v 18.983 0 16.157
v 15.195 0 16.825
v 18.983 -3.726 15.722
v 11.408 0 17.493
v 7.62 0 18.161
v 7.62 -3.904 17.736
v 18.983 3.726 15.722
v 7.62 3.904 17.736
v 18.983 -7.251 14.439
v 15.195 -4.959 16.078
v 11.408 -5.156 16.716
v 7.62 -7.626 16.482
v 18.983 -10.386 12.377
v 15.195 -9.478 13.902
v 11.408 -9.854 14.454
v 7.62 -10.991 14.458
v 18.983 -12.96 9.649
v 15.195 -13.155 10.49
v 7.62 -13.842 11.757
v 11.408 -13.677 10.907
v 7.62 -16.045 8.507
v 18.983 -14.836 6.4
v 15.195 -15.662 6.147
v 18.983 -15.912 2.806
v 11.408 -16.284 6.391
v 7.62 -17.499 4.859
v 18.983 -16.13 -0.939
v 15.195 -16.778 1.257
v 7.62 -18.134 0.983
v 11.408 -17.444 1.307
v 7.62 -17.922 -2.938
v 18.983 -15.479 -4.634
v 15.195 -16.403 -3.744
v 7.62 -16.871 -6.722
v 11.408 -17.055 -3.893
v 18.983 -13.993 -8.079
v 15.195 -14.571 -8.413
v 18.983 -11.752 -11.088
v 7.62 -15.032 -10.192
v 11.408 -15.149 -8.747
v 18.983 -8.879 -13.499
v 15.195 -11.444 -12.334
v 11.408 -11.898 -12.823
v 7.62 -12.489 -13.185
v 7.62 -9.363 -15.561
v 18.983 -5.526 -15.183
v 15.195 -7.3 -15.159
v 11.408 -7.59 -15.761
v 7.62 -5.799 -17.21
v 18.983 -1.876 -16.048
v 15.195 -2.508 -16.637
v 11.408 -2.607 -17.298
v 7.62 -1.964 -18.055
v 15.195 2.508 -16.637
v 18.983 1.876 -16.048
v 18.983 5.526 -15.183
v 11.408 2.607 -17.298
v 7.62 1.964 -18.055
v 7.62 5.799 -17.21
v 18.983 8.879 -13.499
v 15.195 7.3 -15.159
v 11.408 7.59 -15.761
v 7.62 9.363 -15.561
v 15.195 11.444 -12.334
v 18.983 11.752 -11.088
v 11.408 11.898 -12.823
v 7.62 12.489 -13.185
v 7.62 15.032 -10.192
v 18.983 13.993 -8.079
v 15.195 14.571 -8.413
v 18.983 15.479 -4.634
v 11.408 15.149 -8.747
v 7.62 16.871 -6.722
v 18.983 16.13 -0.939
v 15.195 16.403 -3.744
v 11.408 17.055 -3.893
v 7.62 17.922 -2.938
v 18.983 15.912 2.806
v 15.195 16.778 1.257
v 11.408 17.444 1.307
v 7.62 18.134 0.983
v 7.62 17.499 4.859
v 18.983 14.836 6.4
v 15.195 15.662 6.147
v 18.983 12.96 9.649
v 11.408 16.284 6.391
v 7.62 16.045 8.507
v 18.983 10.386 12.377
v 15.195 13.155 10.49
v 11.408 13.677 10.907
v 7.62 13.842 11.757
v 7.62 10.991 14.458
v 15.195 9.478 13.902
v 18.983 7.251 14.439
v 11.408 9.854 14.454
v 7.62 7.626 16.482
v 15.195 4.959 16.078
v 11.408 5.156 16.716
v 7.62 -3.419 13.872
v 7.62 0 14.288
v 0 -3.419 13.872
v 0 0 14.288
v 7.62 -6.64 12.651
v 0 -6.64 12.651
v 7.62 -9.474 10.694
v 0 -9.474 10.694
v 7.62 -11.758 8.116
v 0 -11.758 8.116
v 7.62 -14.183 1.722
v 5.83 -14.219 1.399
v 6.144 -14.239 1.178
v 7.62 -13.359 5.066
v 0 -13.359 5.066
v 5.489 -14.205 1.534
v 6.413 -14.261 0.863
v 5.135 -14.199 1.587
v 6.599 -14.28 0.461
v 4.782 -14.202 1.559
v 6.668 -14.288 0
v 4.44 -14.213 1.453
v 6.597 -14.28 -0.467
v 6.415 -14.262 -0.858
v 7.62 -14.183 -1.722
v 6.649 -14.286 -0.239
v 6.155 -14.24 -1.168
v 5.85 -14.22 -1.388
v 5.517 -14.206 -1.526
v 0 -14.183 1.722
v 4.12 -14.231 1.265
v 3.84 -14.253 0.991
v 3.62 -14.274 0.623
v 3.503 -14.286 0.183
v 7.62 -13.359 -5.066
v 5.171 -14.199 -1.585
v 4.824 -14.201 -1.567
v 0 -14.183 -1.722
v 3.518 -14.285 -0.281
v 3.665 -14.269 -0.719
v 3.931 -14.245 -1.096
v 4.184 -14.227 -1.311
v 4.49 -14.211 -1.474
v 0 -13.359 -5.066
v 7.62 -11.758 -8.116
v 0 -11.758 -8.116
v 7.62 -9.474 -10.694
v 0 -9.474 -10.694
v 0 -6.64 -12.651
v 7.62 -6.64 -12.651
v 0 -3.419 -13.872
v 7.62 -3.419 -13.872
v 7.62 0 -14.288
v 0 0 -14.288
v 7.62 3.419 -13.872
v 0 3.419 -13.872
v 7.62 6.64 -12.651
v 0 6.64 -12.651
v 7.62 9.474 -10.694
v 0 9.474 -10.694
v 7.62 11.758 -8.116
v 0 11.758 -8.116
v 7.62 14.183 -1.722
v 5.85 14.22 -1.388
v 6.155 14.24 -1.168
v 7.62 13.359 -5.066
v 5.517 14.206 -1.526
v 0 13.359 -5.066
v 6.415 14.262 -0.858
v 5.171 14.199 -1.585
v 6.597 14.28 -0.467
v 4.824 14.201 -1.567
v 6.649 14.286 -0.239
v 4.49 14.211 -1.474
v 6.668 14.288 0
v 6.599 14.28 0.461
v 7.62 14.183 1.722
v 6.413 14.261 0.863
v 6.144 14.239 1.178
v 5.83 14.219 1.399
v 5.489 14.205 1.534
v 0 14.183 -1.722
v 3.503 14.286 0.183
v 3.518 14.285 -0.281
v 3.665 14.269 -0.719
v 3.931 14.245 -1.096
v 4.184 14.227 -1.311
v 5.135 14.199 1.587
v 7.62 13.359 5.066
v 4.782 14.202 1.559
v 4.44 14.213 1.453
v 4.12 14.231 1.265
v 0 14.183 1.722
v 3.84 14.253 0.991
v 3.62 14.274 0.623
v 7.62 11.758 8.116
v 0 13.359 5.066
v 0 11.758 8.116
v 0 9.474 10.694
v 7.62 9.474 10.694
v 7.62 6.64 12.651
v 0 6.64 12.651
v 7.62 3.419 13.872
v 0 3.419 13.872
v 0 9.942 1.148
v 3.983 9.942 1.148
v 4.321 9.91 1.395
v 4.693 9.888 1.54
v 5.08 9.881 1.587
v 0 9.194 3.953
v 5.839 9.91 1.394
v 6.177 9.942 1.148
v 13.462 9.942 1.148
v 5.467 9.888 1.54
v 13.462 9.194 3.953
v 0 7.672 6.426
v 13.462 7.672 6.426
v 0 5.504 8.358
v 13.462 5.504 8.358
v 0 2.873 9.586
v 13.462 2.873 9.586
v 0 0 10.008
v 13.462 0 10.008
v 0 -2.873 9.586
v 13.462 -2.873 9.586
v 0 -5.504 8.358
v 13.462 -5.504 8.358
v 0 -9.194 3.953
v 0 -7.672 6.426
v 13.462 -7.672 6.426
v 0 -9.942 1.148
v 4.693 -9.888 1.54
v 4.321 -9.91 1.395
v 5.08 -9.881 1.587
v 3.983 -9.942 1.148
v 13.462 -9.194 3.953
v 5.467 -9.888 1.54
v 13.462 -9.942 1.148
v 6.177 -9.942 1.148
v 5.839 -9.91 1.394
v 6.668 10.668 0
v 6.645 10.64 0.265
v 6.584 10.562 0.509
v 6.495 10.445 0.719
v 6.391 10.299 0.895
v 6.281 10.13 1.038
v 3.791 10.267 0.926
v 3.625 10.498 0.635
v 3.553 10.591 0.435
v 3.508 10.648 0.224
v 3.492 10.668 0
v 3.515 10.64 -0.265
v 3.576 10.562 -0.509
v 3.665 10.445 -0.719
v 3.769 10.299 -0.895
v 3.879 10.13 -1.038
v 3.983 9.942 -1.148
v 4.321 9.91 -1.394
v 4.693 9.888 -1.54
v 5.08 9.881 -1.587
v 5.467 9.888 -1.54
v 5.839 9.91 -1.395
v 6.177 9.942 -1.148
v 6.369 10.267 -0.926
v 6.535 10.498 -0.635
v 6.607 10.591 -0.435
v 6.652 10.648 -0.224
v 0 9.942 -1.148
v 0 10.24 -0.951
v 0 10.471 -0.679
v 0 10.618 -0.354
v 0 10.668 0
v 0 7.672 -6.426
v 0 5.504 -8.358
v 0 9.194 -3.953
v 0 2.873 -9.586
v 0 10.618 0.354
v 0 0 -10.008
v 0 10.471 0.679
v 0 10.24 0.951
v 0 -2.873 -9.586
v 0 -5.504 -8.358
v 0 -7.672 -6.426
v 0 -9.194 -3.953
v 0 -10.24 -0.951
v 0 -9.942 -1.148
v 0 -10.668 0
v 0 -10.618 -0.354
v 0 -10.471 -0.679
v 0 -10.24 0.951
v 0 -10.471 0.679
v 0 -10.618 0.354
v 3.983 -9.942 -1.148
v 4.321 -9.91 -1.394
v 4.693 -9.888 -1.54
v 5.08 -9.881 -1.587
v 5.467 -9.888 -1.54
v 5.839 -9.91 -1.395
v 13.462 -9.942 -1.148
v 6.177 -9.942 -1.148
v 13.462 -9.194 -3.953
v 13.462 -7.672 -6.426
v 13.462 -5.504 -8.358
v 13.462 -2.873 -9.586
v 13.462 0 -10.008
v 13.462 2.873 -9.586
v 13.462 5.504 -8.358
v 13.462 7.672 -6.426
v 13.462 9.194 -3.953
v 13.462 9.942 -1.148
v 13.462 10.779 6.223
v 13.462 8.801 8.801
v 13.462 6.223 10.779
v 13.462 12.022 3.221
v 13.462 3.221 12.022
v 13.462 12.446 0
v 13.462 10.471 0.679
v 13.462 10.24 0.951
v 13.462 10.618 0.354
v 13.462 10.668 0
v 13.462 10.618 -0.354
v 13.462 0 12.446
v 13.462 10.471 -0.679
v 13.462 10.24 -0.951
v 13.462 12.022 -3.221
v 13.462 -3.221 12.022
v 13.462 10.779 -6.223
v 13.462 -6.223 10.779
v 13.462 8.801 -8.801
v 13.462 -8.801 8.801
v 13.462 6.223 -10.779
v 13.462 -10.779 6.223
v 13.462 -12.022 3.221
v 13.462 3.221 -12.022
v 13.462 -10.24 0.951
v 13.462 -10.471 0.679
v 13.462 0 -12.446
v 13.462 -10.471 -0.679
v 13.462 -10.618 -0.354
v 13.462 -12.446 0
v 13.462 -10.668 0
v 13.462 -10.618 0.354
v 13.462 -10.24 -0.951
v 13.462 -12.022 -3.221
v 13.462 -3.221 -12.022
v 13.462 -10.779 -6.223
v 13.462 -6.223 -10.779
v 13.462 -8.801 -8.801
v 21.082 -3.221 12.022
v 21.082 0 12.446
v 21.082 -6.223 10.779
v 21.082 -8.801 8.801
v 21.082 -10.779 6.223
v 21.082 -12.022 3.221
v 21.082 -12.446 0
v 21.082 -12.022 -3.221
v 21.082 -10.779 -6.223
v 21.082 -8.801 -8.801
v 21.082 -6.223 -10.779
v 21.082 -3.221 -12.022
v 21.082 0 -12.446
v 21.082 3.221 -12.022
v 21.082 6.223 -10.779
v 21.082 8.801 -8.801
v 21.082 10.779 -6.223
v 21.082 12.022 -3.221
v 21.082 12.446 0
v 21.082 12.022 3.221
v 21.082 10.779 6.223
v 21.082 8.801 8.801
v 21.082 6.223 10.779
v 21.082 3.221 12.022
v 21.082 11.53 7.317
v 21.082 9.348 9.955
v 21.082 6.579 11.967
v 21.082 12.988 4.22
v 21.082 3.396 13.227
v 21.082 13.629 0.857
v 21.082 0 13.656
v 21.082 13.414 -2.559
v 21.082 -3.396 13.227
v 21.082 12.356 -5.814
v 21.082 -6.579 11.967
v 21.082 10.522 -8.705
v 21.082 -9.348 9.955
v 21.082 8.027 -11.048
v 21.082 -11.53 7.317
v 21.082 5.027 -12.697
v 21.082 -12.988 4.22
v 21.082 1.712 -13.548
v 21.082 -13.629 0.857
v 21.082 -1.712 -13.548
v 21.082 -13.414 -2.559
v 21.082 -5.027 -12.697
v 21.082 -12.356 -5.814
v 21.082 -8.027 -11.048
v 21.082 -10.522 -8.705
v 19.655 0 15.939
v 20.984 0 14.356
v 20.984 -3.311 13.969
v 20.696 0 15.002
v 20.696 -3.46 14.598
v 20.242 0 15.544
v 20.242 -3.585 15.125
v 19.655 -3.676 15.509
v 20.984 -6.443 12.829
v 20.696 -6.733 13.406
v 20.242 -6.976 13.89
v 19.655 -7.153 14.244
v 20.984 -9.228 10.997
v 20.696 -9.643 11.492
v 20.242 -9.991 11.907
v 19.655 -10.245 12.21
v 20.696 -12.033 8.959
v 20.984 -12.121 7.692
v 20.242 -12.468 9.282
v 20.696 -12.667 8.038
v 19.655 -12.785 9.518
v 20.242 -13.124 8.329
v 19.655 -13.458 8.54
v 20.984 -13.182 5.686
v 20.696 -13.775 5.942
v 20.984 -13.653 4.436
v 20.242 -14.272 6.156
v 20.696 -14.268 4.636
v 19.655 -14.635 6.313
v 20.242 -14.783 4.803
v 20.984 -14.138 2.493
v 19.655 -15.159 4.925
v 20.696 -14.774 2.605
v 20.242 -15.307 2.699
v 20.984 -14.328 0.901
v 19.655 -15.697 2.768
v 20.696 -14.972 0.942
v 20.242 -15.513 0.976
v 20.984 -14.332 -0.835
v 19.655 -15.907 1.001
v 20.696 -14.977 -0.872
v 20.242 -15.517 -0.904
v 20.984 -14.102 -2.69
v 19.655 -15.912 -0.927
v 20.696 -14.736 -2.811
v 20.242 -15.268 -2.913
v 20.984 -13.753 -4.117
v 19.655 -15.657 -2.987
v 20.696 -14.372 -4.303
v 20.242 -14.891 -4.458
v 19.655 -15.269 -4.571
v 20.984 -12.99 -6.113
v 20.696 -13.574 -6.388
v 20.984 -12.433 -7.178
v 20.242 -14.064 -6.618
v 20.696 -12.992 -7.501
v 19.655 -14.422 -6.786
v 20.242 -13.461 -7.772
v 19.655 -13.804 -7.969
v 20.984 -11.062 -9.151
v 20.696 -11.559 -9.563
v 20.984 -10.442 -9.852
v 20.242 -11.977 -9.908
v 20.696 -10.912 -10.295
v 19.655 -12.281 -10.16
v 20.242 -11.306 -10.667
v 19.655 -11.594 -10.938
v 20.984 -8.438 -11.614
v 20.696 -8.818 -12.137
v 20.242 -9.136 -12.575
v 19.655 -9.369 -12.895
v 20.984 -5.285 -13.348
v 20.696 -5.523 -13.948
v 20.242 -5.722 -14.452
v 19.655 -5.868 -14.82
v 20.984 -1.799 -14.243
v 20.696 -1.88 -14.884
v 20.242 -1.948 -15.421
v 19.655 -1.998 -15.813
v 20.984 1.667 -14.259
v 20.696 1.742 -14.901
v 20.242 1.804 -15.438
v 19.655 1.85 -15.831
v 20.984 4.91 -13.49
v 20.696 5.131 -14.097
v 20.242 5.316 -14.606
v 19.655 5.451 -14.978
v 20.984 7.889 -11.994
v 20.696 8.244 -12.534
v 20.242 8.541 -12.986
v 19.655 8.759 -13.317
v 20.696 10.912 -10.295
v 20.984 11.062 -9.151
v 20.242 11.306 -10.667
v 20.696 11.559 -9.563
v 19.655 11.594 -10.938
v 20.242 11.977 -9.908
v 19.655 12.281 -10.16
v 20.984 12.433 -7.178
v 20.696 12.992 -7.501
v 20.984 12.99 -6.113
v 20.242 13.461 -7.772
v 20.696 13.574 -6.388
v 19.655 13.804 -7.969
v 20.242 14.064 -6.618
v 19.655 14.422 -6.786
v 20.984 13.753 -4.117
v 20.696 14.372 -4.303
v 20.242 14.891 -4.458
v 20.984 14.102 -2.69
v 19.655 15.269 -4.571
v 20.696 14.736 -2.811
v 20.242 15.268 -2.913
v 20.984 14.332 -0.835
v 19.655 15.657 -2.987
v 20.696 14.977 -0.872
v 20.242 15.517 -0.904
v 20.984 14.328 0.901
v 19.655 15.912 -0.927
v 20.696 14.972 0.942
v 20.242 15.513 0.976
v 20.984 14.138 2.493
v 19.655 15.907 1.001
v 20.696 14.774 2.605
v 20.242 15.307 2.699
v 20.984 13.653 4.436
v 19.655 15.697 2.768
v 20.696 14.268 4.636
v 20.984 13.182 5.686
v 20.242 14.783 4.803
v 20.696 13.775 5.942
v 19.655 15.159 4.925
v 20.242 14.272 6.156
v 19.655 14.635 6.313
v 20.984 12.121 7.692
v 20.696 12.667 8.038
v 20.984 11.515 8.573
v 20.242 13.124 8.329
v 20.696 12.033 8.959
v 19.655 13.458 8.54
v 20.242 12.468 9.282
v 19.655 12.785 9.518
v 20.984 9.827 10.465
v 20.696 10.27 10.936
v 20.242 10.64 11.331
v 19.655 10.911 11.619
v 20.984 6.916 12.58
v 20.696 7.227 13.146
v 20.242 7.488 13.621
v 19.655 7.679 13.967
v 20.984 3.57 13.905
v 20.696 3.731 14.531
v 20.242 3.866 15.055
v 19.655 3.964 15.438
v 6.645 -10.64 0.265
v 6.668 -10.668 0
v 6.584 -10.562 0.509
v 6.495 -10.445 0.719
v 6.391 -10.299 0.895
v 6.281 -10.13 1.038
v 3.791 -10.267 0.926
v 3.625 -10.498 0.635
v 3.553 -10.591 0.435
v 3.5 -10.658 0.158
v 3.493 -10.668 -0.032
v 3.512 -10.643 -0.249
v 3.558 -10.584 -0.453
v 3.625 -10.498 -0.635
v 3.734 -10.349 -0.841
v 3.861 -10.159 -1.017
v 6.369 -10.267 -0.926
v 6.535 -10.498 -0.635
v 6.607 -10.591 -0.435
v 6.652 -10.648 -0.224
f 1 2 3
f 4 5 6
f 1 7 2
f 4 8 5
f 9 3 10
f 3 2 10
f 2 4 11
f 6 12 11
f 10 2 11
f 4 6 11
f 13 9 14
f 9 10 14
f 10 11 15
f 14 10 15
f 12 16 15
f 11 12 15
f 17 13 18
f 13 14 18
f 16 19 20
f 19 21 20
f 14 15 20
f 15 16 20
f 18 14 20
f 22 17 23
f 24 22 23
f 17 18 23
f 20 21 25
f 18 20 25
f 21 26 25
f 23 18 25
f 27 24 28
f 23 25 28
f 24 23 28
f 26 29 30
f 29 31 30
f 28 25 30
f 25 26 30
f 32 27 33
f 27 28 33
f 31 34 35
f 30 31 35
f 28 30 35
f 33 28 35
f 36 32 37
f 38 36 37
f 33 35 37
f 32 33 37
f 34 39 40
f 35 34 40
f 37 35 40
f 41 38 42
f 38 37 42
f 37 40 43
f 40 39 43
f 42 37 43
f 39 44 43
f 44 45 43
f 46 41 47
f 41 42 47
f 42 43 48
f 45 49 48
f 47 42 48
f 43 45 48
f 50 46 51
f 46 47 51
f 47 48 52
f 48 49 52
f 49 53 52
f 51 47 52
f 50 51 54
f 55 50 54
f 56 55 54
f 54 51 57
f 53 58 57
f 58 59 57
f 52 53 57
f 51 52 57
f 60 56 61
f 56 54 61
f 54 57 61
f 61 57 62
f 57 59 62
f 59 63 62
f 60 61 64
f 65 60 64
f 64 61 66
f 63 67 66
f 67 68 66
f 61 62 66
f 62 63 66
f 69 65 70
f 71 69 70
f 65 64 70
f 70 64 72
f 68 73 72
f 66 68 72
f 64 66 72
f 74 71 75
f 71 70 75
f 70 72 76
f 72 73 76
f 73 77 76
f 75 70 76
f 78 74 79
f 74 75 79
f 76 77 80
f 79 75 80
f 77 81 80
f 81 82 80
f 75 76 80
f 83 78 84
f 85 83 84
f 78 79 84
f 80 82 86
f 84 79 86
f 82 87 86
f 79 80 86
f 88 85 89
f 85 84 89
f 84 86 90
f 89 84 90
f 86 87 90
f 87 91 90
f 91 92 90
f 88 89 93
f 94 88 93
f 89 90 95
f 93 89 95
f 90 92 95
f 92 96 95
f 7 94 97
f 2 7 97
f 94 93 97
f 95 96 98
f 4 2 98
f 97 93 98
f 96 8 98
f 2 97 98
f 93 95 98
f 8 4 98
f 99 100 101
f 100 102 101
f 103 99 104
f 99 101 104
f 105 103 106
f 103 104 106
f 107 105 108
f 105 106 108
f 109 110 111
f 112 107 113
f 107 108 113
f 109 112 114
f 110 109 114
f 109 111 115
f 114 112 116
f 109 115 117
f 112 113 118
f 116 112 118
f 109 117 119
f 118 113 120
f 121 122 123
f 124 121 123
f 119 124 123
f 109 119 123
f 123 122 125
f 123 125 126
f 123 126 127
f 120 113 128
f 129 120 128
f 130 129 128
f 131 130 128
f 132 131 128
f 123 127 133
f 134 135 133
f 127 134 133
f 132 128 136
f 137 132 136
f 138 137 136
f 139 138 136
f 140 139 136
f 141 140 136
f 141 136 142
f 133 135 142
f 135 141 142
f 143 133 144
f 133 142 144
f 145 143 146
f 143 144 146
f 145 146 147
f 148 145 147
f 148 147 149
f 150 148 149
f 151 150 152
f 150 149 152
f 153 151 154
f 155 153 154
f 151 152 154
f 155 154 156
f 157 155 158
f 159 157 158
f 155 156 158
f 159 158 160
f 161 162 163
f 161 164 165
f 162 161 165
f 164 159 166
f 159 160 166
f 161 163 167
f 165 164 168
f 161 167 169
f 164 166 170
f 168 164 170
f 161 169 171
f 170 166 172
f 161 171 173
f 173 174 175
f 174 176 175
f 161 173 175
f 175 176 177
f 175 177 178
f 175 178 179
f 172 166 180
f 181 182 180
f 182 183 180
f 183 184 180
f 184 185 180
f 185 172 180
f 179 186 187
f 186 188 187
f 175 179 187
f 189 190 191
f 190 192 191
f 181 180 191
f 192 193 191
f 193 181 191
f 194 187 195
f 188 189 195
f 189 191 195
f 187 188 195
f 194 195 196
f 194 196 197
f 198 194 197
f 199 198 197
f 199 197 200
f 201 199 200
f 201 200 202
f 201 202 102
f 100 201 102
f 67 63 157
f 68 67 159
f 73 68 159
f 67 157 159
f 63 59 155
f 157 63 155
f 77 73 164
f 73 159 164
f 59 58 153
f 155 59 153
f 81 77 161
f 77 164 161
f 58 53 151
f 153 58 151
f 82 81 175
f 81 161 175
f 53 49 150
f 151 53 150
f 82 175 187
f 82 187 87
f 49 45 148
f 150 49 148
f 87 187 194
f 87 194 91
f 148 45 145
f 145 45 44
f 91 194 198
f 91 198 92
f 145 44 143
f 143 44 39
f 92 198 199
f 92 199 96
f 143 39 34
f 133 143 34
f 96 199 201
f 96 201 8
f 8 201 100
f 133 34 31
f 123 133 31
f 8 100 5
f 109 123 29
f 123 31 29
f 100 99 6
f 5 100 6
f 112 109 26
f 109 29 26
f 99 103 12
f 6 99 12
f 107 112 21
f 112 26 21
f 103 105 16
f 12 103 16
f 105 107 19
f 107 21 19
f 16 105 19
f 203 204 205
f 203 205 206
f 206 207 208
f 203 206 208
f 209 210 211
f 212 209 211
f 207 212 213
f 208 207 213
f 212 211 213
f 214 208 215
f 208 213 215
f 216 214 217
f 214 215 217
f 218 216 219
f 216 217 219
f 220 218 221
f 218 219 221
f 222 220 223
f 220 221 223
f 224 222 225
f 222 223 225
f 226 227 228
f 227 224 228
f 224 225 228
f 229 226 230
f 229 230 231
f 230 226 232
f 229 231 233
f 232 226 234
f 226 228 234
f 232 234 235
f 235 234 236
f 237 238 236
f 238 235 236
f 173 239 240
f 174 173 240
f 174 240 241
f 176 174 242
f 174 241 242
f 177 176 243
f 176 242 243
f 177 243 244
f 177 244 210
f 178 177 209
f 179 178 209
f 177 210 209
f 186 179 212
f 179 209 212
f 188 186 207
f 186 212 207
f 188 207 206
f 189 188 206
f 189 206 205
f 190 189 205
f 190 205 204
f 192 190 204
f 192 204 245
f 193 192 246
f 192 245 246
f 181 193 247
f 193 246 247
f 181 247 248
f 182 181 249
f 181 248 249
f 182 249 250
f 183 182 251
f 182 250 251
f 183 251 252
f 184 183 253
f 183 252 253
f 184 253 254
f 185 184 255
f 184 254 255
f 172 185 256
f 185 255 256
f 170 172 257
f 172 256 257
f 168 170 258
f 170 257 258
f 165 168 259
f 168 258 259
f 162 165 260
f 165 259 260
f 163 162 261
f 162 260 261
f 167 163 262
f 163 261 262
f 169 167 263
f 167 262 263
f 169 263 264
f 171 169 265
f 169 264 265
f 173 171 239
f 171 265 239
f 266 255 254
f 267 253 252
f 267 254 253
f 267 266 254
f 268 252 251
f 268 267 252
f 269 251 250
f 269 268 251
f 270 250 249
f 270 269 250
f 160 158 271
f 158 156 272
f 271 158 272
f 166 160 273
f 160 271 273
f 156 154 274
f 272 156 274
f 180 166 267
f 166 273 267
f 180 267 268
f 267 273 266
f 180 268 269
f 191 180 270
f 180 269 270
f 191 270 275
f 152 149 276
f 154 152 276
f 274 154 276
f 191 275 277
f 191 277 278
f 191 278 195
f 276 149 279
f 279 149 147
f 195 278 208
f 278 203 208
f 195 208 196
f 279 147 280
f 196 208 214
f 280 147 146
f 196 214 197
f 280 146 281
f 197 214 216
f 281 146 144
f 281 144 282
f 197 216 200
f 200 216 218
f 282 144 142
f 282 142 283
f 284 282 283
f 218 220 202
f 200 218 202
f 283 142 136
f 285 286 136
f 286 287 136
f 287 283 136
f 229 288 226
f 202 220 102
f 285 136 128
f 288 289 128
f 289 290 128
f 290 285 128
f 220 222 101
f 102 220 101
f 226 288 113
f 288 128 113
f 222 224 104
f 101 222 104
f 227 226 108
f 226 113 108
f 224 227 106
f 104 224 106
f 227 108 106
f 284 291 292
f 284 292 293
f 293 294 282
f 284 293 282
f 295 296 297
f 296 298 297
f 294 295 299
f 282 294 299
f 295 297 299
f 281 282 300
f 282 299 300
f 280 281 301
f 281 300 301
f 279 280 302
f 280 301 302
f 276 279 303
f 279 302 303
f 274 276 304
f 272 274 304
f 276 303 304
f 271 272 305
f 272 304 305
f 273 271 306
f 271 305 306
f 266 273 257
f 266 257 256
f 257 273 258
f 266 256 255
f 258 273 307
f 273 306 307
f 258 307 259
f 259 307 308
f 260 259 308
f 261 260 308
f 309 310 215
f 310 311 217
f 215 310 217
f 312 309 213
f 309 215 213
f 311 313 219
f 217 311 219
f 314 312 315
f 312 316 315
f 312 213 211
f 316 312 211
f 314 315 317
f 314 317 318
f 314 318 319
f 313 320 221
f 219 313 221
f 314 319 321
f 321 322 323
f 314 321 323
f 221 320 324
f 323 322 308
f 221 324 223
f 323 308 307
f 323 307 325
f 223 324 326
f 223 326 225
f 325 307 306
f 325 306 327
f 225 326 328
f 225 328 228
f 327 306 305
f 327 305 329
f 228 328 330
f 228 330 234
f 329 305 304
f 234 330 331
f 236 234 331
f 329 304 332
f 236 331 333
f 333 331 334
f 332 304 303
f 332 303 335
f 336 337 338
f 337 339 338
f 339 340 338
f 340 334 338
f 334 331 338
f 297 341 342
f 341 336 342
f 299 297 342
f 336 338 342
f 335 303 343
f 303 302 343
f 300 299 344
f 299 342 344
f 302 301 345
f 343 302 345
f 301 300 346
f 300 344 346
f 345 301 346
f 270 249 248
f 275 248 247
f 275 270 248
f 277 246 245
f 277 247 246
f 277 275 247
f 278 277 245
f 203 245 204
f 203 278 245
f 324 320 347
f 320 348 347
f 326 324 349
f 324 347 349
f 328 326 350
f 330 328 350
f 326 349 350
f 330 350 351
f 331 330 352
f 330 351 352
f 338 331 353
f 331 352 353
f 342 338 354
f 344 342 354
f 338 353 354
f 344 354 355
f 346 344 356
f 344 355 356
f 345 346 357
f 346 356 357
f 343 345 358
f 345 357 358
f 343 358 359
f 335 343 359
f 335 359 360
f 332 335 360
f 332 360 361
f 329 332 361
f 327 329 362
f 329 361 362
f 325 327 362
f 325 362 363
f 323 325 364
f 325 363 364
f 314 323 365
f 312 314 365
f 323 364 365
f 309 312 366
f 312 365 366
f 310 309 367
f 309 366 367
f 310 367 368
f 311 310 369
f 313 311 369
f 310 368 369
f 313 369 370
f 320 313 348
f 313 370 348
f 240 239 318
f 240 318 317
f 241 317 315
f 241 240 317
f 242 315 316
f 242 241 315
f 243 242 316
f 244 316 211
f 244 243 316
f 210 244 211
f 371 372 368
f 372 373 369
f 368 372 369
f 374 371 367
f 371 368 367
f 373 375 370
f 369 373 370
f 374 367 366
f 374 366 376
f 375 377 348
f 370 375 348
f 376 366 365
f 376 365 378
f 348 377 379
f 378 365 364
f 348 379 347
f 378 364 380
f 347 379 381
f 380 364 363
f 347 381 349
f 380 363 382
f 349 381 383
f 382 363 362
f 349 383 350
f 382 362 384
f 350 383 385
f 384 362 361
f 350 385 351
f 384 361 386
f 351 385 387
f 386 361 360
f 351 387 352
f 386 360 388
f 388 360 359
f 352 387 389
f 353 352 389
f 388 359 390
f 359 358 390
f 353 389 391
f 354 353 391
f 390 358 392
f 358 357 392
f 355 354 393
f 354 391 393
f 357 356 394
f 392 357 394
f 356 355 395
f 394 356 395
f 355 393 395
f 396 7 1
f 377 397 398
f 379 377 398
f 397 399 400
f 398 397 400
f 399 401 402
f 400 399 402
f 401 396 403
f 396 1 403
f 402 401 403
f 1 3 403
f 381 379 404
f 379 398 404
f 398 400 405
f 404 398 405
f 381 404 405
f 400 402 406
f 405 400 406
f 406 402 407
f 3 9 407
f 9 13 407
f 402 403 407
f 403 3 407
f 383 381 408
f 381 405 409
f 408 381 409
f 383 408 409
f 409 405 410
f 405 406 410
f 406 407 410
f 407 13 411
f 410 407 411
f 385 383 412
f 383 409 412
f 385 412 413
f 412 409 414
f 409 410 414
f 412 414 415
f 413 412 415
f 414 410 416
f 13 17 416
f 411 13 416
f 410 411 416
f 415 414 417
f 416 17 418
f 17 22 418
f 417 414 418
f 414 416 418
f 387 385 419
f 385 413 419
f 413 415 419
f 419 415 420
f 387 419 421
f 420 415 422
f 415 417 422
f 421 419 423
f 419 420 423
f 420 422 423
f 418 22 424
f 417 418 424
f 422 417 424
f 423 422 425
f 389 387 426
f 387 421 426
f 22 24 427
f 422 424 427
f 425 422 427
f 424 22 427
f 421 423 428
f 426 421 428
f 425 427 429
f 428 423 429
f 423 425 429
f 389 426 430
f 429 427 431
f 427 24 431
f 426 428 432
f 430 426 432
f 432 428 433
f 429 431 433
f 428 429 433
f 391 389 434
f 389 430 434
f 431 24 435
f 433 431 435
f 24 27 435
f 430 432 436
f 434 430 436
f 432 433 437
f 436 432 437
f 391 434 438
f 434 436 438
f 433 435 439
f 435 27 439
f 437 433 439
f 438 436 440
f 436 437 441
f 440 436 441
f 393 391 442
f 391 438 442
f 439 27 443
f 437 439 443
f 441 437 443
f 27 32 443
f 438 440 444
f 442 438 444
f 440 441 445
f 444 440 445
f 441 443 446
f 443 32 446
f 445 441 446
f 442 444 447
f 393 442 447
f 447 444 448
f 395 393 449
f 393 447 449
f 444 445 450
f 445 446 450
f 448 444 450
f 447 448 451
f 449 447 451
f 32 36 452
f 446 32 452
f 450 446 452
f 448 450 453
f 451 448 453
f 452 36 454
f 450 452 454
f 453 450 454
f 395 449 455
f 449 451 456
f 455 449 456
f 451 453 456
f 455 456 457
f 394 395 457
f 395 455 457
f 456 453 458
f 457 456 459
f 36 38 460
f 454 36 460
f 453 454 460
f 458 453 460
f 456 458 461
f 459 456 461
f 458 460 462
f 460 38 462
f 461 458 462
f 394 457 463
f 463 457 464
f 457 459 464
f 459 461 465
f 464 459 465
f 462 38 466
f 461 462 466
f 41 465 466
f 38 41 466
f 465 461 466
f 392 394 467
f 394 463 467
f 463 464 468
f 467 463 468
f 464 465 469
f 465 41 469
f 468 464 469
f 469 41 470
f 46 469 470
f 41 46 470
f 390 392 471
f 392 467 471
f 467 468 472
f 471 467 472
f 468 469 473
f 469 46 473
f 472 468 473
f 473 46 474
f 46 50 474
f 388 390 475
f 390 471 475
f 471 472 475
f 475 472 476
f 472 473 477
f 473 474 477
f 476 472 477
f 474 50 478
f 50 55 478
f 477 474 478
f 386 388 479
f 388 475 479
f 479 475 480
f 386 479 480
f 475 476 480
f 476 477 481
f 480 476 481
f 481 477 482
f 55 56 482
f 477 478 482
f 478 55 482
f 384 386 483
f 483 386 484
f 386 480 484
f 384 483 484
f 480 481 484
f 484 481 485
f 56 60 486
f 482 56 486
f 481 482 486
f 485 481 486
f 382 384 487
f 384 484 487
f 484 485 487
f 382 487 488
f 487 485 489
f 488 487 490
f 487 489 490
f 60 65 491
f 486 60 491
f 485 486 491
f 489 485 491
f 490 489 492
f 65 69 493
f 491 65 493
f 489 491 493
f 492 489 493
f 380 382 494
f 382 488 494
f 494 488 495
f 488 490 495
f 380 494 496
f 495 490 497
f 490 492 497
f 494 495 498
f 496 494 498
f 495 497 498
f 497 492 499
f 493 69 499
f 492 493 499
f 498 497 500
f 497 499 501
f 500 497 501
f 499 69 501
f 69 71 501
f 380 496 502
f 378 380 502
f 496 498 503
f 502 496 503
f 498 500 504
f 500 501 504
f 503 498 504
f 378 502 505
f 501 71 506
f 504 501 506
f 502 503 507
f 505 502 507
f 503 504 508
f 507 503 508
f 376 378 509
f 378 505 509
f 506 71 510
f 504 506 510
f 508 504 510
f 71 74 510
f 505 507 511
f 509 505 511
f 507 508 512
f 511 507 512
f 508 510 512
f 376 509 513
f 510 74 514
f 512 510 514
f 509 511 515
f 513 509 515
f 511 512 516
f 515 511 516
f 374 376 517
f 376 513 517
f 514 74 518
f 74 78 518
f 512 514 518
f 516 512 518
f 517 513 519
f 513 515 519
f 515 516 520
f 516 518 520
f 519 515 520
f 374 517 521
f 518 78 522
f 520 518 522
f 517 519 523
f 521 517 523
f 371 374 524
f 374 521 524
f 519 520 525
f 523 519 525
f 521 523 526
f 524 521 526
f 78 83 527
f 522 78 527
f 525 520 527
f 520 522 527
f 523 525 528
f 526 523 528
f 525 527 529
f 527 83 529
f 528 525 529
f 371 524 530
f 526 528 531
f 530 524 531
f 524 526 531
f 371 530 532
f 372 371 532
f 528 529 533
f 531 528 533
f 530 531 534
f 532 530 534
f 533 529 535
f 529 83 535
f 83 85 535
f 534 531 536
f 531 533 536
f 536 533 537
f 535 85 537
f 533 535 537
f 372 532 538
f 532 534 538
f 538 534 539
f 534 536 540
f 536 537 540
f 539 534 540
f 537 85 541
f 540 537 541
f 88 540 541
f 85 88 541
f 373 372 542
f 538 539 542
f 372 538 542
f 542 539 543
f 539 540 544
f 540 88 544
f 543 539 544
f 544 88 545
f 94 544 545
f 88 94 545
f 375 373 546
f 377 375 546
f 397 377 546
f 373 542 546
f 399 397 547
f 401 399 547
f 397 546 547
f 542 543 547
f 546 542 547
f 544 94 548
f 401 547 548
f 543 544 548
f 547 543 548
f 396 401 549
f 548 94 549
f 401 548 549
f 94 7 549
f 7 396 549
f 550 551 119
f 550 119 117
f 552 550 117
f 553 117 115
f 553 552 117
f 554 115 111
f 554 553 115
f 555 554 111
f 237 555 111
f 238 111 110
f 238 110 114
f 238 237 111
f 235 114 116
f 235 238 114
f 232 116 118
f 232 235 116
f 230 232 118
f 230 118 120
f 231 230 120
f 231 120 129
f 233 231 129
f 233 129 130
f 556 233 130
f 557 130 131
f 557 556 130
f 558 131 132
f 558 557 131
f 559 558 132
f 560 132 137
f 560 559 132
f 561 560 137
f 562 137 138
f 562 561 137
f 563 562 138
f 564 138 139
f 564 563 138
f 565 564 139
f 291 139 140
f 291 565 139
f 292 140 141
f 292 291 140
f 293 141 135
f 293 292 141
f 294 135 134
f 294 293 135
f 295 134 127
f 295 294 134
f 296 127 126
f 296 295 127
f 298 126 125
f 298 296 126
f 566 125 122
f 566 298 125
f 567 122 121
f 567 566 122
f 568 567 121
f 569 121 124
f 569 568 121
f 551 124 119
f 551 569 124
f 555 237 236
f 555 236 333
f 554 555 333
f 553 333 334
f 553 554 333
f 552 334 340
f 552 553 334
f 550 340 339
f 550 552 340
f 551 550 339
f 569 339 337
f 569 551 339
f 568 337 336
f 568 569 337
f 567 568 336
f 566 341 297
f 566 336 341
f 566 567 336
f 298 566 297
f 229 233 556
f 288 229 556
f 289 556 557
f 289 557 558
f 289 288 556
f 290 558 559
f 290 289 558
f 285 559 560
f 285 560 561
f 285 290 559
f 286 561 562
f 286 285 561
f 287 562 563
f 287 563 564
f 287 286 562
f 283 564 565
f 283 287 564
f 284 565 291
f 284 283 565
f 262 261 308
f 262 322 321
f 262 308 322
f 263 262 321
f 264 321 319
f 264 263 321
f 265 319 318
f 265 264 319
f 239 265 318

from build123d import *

# Parameters (mm, degrees)
F2_R          = 2.54
F4_DEPTH      = 21.083
F5_R          = 1.5875
F6_DEPTH      = 18.162
F6_DEPTH_BACK = 18.162


with BuildPart() as f1:
    # F0 (on Front) → F1 (revolve)
    with BuildSketch(Plane.XZ):
        Polygon((7.62, 18.161), (7.62, 14.2875), (0, 14.2875), (0, 10.0076), (13.462, 10.0076), (13.462, 12.446), (21.082, 12.446), (21.082, 15.7872861857), align=None)
    revolve(axis=Axis((10.541, 0, 0), (1, 0, 0)))

    # F2
    f2_edges = [f1.edges().sort_by_distance(p)[0] for p in [
        (21.082, 0, -15.787286),
    ]]
    fillet(f2_edges, radius=F2_R)

    # F3 (on Right) → F4 (cut, through all)
    with BuildSketch(Plane.YZ):
        with BuildLine():
            ThreePointArc((-9.94156, -1.1477989922), (-10.0076, 0), (-9.94156, 1.1477989922))
            ThreePointArc((-9.94156, 1.1477989922), (-10.668, 0), (-9.94156, -1.1477989922))
        make_face()
        with BuildLine():
            ThreePointArc((9.94156, 1.1477989922), (9.9910763588, 0.574848634), (10.0076, 0))
            ThreePointArc((10.0076, 0), (9.9910763588, -0.574848634), (9.94156, -1.1477989922))
            ThreePointArc((9.94156, -1.1477989922), (10.4711312129, -0.6791828914), (10.668, 0))
            ThreePointArc((10.668, 0), (10.4711312129, 0.6791828914), (9.94156, 1.1477989922))
        make_face()
    extrude(amount=F4_DEPTH, mode=Mode.SUBTRACT)

    # F5 (on Front) → F6 (cut, two sides)
    with BuildSketch(Plane.XZ) as f6_sk:
        with Locations((5.08, 0)):
            Circle(F5_R)
    extrude(amount=-F6_DEPTH, mode=Mode.SUBTRACT)
    extrude(f6_sk.sketch, amount=F6_DEPTH_BACK, mode=Mode.SUBTRACT)


solid = f1.part
